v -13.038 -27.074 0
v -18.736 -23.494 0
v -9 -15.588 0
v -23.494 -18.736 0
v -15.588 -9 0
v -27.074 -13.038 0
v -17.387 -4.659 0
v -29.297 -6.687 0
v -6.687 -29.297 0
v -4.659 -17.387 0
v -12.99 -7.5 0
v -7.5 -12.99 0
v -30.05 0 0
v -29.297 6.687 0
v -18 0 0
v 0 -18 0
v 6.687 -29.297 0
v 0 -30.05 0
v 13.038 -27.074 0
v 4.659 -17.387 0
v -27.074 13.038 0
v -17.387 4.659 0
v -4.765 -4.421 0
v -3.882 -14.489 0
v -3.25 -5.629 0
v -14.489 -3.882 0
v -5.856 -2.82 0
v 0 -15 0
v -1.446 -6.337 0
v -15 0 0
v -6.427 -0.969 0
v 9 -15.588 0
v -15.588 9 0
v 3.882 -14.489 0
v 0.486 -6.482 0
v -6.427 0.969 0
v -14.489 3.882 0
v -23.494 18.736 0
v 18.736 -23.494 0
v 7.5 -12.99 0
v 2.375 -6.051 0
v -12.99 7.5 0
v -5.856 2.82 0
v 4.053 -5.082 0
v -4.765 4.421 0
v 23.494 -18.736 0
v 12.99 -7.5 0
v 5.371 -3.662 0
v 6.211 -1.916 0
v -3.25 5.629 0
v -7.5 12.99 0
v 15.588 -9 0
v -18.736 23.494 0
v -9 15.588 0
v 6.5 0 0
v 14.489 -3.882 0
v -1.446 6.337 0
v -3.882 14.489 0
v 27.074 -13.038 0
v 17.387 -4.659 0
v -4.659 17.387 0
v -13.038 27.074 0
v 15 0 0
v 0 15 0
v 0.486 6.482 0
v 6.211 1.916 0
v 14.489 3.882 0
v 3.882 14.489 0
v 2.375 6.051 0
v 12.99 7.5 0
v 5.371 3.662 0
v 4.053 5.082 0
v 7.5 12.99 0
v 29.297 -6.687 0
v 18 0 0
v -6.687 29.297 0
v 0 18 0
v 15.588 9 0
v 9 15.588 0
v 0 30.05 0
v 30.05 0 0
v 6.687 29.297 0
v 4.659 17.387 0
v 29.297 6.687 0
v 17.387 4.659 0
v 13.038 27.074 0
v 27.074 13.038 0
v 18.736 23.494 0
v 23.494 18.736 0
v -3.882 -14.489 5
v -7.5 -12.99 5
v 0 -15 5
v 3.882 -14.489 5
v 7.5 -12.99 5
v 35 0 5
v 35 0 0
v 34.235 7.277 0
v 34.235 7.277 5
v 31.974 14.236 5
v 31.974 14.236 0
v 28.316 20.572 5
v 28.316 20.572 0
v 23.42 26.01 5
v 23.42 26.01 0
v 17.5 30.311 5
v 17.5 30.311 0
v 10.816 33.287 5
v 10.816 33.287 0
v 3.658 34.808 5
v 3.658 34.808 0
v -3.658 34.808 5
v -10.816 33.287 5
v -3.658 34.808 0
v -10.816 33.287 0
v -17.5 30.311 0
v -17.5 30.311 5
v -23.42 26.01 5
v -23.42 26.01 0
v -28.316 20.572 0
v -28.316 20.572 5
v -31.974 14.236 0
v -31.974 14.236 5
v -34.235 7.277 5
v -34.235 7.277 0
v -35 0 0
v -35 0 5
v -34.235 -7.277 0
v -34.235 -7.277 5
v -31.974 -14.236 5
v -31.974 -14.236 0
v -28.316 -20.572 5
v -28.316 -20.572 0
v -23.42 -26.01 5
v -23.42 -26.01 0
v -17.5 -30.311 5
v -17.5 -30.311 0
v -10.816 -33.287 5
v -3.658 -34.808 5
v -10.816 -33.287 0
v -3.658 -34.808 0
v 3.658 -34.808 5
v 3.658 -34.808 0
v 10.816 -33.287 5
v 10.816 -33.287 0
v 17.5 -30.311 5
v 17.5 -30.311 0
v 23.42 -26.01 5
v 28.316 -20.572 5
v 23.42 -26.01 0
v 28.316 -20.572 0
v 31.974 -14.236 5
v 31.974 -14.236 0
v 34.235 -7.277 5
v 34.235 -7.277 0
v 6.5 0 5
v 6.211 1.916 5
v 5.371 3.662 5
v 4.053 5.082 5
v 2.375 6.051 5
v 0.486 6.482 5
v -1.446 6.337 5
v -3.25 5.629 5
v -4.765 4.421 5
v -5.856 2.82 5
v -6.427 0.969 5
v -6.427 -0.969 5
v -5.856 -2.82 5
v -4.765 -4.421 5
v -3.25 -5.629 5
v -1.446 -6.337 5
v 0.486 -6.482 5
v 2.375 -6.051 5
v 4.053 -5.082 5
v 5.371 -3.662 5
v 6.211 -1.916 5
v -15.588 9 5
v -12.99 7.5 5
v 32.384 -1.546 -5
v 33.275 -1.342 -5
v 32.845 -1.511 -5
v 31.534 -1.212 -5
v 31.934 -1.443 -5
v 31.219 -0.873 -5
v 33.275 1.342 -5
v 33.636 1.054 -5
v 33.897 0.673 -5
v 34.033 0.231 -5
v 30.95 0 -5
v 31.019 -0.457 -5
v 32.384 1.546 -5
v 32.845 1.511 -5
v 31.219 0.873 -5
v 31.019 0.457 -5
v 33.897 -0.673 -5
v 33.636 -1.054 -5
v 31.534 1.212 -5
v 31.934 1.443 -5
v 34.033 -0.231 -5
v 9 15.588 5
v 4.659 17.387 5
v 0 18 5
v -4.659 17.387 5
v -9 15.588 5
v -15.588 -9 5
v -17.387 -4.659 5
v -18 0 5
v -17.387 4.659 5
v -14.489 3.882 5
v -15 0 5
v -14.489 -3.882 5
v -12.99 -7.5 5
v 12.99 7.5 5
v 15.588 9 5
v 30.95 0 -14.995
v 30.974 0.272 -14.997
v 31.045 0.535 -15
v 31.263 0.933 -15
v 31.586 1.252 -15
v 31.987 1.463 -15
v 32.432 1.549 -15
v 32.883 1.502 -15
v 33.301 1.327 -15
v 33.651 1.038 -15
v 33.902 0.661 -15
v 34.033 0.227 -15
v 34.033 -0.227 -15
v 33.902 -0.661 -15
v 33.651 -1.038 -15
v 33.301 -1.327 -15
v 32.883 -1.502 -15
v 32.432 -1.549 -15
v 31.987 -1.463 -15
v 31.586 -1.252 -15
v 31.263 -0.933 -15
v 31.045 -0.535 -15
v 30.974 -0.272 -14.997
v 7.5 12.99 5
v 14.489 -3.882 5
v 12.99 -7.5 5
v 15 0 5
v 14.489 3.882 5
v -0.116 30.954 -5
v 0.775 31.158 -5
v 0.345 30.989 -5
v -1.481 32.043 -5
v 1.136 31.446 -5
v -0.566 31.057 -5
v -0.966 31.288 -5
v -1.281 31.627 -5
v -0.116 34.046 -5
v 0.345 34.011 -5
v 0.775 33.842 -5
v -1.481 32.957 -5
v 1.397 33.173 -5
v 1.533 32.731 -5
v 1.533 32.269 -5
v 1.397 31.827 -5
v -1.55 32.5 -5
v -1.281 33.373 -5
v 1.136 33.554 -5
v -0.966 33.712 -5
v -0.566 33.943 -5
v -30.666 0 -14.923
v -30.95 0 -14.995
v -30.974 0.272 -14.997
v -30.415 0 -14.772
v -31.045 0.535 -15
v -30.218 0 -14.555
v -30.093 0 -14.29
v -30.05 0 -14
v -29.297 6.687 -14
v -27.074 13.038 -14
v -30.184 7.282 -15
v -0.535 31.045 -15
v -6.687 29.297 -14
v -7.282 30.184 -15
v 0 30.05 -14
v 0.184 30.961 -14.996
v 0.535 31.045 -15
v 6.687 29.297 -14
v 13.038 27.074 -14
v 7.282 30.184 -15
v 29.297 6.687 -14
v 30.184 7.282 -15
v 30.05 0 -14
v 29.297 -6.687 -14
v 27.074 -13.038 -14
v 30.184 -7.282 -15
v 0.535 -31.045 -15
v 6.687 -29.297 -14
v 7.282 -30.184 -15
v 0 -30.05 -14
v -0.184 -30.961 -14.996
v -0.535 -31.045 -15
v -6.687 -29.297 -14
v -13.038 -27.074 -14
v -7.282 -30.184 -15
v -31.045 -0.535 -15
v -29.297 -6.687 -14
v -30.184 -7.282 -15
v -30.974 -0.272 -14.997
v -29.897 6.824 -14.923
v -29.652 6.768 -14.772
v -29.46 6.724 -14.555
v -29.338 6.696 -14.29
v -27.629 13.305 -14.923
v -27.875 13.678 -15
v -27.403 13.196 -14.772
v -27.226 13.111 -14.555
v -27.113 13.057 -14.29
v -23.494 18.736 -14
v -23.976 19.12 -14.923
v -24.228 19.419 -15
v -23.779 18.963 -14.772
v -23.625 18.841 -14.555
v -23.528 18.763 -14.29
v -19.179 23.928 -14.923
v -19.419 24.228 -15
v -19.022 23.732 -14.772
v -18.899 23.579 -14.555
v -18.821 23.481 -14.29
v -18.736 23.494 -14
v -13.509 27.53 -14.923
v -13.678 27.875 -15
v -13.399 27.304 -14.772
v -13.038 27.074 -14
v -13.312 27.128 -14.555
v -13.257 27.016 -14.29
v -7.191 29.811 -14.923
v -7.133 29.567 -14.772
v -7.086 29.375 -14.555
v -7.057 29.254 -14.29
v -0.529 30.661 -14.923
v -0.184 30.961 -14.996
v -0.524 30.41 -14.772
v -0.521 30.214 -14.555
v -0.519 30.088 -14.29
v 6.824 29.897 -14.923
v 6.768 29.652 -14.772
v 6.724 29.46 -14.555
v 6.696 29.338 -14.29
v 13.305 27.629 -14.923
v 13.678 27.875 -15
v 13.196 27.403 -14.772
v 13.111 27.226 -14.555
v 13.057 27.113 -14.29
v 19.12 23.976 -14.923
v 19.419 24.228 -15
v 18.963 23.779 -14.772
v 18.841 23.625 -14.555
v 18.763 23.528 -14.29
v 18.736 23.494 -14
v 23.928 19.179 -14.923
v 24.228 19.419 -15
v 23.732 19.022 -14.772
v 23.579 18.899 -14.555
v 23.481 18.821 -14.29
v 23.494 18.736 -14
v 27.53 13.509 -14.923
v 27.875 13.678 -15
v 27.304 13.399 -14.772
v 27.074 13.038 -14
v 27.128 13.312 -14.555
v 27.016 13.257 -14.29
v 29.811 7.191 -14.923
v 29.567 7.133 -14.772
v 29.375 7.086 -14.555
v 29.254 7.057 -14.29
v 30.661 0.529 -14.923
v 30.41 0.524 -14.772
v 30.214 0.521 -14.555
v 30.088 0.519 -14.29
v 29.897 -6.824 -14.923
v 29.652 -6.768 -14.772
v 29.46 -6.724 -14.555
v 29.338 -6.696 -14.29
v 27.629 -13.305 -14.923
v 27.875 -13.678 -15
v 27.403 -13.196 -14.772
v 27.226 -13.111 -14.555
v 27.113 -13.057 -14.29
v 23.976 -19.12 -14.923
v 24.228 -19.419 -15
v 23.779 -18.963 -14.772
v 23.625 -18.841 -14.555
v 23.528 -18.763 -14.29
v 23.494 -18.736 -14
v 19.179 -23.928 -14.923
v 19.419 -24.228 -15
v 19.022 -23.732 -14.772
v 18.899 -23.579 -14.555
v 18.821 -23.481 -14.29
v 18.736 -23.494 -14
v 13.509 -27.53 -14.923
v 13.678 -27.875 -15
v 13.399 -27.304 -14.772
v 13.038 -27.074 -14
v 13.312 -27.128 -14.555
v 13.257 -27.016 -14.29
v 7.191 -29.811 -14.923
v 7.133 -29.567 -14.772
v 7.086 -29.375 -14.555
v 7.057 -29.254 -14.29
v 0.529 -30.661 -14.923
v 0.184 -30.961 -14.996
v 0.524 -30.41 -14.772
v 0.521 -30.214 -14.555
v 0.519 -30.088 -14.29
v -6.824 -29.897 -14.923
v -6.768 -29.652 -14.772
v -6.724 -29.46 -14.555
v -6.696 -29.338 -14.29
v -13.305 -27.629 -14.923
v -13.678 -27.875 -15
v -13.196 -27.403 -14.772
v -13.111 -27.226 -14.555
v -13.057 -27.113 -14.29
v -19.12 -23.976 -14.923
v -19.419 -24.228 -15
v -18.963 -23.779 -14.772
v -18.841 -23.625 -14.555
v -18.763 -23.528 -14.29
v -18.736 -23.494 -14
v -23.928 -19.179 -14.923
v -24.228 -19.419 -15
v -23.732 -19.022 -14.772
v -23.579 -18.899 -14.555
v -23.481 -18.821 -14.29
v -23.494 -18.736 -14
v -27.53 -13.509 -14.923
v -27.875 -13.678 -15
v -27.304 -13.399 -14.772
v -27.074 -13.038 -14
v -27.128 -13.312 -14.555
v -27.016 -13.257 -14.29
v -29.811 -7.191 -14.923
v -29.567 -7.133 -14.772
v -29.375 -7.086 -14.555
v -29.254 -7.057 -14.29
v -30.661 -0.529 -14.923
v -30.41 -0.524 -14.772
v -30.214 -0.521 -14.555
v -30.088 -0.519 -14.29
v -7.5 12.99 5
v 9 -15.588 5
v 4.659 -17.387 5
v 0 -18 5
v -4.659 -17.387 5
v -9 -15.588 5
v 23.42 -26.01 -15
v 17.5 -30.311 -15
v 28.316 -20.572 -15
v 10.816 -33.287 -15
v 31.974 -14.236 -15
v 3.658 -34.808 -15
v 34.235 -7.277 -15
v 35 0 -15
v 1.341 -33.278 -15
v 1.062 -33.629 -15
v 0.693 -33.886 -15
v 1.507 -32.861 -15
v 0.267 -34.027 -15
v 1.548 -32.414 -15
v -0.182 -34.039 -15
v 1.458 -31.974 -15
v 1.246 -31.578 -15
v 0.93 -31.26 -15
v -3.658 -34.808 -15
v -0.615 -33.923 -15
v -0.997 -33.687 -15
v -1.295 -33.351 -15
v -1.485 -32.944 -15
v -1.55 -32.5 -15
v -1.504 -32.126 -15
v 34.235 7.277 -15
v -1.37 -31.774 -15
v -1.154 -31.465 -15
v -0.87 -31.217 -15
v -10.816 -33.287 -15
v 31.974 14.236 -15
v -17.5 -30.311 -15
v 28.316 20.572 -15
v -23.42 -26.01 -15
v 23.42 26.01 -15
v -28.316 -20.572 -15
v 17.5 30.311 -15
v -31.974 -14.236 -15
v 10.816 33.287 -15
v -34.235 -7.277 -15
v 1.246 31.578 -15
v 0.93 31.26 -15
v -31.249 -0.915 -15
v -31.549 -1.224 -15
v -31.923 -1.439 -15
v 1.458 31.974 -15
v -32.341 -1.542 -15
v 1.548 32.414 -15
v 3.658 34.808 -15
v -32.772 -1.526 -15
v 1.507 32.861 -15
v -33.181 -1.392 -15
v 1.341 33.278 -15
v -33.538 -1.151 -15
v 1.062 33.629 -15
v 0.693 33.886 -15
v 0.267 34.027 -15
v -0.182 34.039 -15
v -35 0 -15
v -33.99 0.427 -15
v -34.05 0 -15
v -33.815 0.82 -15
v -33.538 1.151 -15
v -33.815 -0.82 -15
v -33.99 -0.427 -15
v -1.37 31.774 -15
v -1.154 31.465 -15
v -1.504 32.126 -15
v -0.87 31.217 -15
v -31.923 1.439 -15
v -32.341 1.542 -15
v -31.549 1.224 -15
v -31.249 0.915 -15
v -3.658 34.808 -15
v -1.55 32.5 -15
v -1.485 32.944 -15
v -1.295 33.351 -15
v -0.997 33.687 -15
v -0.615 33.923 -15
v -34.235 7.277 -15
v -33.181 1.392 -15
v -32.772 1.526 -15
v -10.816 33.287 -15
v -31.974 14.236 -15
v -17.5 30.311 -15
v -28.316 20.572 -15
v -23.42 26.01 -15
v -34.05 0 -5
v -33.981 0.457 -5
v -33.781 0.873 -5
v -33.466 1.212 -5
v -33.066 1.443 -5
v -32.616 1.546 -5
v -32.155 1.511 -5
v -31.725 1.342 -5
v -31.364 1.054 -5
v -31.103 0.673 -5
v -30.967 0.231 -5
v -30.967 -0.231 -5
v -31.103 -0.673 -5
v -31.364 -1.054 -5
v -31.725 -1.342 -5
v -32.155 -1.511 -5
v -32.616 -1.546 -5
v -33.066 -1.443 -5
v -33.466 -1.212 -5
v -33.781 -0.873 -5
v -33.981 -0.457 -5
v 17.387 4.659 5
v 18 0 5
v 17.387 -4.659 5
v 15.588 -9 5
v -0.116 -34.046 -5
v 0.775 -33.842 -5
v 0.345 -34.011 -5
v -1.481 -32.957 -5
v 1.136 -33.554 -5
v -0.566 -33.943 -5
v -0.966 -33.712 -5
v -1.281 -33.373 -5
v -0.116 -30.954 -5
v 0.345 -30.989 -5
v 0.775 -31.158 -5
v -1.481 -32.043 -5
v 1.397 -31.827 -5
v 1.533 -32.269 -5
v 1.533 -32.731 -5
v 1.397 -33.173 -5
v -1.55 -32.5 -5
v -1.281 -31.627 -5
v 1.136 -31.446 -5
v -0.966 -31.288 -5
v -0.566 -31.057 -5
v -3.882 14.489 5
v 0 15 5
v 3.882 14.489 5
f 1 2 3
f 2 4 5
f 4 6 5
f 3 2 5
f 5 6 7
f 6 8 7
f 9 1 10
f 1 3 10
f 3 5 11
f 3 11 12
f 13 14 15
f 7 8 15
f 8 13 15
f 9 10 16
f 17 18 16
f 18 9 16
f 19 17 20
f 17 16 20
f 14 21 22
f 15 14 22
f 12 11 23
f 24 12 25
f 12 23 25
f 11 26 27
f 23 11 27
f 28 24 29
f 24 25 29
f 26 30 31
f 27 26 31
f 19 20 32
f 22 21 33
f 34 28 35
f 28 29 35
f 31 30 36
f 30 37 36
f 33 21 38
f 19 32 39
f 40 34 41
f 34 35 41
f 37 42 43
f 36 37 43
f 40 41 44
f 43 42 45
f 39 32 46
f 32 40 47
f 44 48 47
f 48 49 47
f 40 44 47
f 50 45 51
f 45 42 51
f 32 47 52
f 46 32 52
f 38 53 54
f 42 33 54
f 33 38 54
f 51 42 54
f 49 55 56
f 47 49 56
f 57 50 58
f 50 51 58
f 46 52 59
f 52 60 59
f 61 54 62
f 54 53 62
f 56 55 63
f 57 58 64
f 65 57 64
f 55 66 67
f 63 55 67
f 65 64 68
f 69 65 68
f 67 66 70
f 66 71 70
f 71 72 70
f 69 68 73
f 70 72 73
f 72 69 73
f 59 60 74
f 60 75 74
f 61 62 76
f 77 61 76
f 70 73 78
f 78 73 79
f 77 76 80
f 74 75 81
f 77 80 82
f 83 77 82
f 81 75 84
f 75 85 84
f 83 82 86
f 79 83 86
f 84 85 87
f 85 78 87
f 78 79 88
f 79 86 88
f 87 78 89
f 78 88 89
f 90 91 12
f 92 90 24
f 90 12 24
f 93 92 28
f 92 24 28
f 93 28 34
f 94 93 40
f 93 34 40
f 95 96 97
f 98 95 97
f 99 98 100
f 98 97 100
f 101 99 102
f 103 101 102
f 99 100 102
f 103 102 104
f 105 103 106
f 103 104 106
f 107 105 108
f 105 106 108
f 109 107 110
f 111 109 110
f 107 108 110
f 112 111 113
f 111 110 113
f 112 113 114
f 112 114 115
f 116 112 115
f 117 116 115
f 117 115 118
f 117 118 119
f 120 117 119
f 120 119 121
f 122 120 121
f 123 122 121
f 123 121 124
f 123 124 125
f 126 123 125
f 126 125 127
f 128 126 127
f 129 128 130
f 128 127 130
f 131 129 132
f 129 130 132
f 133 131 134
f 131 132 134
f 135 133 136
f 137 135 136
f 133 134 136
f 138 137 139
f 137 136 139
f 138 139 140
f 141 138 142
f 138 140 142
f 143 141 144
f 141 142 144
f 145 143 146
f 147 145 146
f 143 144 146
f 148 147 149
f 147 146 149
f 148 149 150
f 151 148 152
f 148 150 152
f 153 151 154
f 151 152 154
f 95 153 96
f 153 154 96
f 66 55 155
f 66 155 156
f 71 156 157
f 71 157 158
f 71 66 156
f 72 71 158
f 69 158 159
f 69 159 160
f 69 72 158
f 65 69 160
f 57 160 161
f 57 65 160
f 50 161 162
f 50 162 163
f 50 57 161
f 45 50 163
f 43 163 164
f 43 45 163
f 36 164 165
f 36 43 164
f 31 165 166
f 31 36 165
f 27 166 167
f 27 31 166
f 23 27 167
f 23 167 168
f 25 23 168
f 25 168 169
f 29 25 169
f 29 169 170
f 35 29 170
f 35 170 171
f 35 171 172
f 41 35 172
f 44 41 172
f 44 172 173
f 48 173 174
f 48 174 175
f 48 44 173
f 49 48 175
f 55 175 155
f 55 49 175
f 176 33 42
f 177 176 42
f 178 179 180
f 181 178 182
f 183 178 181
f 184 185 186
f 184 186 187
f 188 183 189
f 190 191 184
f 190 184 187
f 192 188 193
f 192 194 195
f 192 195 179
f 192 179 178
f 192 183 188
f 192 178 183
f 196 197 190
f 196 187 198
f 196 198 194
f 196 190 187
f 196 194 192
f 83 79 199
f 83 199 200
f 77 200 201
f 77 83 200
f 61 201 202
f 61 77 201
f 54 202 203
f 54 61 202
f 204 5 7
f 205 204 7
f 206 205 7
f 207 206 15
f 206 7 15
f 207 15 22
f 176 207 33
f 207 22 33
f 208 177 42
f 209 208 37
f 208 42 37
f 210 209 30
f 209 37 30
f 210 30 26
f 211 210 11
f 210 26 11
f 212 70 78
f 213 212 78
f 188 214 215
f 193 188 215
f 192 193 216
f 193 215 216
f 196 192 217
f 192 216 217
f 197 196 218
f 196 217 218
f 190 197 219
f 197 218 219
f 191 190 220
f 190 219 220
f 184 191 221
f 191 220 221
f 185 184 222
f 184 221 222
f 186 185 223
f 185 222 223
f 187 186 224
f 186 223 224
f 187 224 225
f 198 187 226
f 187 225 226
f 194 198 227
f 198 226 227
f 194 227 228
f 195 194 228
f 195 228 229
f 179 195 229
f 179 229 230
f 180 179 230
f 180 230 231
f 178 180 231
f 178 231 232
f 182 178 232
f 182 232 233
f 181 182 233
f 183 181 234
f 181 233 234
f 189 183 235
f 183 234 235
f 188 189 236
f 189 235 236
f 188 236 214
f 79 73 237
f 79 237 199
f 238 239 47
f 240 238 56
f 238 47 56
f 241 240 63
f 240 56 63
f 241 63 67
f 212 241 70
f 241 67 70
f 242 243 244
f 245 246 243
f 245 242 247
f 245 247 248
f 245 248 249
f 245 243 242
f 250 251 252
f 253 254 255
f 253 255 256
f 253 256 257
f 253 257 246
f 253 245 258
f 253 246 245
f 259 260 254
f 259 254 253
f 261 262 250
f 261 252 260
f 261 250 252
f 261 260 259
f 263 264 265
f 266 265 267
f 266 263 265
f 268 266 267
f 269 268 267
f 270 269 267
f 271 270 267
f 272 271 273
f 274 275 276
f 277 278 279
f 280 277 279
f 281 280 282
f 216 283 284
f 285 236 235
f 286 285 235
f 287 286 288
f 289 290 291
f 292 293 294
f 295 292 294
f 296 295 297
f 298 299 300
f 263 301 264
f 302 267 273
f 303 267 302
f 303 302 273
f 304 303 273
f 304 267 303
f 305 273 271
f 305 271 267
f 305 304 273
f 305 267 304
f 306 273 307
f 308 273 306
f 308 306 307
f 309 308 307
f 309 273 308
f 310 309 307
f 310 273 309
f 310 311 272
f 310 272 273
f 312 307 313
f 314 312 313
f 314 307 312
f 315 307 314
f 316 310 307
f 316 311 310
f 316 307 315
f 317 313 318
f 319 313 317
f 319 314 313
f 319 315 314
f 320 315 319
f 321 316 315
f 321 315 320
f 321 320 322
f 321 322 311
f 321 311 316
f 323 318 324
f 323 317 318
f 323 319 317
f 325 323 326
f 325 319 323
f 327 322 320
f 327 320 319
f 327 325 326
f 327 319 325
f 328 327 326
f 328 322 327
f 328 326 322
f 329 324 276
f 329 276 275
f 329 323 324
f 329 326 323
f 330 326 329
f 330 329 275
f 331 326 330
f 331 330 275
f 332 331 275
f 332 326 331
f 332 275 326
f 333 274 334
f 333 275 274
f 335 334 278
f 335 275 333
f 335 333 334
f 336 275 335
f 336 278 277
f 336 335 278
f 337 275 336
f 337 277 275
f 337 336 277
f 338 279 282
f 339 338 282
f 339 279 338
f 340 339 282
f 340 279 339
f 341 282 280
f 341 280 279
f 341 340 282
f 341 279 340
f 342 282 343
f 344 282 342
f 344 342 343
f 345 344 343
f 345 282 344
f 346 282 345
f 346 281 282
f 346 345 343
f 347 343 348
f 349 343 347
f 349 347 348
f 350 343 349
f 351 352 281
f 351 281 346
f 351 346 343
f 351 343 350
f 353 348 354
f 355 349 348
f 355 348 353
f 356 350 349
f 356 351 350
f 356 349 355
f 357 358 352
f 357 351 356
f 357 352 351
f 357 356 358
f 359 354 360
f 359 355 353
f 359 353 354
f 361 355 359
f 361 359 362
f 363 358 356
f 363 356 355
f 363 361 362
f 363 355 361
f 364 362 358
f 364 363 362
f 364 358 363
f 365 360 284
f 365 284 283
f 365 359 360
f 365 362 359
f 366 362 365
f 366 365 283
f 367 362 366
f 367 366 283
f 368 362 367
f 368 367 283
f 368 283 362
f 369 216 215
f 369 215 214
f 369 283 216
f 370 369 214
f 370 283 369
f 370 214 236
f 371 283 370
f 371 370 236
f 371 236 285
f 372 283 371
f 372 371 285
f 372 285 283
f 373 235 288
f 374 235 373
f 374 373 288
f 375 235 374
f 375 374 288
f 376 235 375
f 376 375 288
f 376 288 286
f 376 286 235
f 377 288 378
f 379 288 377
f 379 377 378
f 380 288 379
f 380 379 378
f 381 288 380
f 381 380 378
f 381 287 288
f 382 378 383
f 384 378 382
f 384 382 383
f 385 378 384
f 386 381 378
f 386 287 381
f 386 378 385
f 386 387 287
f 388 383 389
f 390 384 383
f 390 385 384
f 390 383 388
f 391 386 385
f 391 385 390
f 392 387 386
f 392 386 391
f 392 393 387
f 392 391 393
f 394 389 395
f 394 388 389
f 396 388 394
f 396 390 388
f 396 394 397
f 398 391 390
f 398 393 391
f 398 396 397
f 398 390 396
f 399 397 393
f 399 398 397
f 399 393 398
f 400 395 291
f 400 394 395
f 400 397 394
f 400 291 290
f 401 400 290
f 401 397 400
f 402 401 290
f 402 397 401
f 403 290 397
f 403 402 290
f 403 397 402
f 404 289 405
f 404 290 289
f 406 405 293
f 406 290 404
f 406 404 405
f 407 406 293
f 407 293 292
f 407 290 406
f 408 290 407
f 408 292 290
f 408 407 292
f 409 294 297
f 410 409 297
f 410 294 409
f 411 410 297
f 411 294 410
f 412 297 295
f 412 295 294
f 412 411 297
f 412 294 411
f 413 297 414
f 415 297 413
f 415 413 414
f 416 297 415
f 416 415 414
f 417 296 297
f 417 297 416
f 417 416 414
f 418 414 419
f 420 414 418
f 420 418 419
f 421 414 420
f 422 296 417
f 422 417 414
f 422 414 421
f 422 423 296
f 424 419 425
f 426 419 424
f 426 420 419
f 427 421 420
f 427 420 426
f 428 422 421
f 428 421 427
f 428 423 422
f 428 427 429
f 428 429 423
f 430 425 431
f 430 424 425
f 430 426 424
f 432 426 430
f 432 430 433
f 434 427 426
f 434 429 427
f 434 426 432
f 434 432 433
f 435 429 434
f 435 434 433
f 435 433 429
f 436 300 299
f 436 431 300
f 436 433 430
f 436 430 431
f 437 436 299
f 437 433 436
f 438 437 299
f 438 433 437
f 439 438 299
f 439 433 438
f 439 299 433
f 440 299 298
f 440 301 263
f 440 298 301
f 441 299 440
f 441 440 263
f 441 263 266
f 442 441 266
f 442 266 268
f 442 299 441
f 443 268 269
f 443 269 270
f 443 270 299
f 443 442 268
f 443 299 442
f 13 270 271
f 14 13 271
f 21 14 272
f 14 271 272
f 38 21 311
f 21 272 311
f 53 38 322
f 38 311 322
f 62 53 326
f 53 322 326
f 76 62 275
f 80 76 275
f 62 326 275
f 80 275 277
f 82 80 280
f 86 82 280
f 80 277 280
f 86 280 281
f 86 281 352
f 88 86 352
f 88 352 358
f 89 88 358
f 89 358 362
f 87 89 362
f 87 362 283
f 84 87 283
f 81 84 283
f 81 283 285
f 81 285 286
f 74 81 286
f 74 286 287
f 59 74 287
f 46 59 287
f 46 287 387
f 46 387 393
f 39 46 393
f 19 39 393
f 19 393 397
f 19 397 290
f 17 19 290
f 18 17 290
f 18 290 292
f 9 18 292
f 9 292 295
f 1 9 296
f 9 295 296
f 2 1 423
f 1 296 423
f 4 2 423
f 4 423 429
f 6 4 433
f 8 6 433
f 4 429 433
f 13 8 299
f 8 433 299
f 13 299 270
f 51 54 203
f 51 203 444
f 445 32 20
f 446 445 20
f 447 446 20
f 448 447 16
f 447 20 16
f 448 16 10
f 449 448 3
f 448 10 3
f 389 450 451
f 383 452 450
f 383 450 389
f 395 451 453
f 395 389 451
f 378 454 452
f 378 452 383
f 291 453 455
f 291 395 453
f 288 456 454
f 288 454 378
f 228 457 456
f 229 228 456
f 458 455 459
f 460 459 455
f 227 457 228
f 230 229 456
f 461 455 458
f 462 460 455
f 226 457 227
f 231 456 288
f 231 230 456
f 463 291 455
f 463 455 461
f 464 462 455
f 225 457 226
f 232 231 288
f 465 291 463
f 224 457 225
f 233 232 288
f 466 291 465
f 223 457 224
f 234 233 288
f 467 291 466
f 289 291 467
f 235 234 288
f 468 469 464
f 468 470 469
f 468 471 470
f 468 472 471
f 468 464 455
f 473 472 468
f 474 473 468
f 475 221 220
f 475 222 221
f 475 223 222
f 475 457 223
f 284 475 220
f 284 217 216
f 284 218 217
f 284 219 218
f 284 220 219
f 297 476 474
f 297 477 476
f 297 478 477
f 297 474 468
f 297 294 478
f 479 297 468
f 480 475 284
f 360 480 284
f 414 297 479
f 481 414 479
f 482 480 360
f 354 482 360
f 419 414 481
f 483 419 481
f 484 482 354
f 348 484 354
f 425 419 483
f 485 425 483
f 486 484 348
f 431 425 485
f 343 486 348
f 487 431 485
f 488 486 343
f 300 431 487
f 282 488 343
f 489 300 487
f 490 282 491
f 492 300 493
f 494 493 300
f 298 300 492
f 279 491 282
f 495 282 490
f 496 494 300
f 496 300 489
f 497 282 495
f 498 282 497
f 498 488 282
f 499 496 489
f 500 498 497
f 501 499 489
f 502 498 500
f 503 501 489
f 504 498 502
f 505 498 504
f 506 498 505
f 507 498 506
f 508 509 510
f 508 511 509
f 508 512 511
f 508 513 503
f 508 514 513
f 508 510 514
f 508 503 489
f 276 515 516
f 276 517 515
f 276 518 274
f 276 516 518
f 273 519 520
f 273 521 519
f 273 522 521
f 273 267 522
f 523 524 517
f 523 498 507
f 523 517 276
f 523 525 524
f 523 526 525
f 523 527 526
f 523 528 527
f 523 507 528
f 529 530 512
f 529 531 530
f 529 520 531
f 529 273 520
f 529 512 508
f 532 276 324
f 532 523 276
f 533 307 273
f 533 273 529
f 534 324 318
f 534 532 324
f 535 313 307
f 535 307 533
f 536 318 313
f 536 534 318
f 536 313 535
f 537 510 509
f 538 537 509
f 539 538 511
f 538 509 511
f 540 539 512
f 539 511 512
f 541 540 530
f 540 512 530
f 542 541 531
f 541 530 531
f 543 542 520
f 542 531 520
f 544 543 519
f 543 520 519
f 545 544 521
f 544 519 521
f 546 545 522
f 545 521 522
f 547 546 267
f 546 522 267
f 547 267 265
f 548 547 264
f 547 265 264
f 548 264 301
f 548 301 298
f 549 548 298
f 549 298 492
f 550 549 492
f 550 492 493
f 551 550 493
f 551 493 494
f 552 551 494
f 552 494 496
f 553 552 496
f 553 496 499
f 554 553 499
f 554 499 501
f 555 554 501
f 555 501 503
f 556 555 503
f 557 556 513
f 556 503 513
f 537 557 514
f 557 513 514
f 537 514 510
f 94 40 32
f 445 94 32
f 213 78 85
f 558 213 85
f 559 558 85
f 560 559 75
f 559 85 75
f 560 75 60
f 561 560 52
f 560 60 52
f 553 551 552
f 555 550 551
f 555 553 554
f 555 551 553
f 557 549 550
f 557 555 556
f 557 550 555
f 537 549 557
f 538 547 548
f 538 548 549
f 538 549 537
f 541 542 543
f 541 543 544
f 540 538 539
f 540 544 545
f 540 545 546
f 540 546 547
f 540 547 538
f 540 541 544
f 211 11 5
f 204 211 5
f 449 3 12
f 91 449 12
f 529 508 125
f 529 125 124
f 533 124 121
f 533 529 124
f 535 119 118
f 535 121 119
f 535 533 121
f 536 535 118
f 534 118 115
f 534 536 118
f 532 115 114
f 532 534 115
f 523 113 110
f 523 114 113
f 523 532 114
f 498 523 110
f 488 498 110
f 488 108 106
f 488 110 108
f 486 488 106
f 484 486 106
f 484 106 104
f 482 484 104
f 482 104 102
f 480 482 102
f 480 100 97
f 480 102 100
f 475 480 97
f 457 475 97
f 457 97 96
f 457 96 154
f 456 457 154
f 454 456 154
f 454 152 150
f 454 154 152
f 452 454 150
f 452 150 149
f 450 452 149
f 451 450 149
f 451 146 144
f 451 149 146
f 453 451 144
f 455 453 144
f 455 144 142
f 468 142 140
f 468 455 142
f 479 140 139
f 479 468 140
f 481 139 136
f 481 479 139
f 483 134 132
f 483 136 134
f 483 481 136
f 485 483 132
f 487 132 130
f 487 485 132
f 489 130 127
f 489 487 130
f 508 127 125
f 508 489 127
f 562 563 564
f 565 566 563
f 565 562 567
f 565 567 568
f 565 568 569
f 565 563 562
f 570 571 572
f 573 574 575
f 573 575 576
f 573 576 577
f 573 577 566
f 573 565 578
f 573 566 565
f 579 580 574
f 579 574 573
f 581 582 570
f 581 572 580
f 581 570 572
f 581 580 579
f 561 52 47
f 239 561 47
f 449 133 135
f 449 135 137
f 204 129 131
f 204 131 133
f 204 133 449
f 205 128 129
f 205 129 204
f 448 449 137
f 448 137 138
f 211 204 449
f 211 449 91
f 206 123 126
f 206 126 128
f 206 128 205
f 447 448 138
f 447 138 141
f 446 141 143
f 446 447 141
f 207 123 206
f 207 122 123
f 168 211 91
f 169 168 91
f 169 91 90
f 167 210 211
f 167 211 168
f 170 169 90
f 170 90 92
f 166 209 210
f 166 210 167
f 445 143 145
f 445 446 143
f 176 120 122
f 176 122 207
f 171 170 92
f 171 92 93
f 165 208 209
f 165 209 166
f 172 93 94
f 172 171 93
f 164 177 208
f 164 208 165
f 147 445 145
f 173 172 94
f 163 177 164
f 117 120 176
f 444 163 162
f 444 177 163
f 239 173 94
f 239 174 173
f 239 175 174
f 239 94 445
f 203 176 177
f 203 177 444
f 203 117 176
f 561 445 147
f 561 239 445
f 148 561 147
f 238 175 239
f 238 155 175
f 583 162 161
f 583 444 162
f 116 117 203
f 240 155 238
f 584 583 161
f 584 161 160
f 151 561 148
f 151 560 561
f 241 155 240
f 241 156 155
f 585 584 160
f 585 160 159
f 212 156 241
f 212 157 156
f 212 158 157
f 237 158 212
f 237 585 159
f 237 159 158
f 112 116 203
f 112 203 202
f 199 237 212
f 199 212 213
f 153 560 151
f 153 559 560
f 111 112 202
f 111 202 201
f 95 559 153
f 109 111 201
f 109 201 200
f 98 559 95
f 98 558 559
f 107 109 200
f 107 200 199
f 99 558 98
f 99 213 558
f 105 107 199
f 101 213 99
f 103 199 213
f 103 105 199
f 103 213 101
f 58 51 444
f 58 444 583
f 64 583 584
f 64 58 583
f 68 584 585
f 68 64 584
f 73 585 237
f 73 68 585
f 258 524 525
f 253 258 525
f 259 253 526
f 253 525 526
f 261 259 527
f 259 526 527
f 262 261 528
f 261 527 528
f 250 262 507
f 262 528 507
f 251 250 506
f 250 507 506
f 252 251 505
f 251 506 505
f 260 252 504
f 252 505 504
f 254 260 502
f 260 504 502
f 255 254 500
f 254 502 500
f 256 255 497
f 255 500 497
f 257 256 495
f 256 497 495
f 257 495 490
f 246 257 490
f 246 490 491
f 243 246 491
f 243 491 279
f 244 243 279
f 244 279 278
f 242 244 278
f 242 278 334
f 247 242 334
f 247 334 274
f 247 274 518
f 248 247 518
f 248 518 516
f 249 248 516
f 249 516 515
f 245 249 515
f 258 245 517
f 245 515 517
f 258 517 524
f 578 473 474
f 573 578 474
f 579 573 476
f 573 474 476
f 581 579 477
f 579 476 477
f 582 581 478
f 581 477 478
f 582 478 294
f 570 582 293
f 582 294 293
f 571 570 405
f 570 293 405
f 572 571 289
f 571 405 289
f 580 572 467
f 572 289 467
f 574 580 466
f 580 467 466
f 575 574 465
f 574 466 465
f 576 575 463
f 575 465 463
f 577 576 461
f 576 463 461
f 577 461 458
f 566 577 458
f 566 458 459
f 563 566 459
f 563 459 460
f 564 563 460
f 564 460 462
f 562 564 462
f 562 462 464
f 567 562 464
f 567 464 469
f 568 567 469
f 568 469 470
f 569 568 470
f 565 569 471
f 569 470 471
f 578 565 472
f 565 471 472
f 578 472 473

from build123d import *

# Parameters (mm, degrees)
SKETCH_2_R          = 35
SKETCH_2_R_2        = 6.5
EXTRUDE_1_DEPTH     = 5
EXTRUDE_START       = 15
SKETCH_3_R          = 35
SKETCH_3_R_2        = 30.05
EXTRUDE_2_DEPTH     = 15
SKETCH_4_R          = 1.55
CUT_EXTRUDE_1_DEPTH = 10
FILLET_1_R          = 1
CUT_EXTRUDE_2_DEPTH = 52.720402193


with BuildPart() as part:
    # 草图2 → 凸台-拉伸1 (new body)
    with BuildSketch(Plane.XY):
        Circle(SKETCH_2_R)
        Circle(SKETCH_2_R_2, mode=Mode.SUBTRACT)
    extrude(amount=EXTRUDE_1_DEPTH)

    # 草图3 → 凸台-拉伸2 (add)
    with BuildSketch(Plane(origin=(0, 0, 0), x_dir=(-1, 0, 0), z_dir=(0, 0, -1)).offset(EXTRUDE_START)):
        Circle(SKETCH_3_R)
        Circle(SKETCH_3_R_2, mode=Mode.SUBTRACT)
    extrude(amount=-EXTRUDE_2_DEPTH)

    # 草图4 → 切除-拉伸1 (cut)
    with BuildSketch(Plane(origin=(0, 0, -15), x_dir=(-1, 0, 0), z_dir=(0, 0, -1))):
        with Locations((0, 32.5)):
            Circle(SKETCH_4_R)
        with Locations((32.5, 0)):
            Circle(SKETCH_4_R)
        with Locations((0, -32.5)):
            Circle(SKETCH_4_R)
        with Locations((-32.5, 0)):
            Circle(SKETCH_4_R)
    extrude(amount=-CUT_EXTRUDE_1_DEPTH, mode=Mode.SUBTRACT)

    # 圆角1
    # the kernel refuses this fillet: 1 mm, written as the material it takes off along each edge
    with BuildSketch(Plane(origin=(0, 0, -15), x_dir=(-1, 0, 0), z_dir=(0, -1, 0))) as fillet_1_piece_1:
        with BuildLine():
            CenterArc((30.05 + FILLET_1_R, -FILLET_1_R), FILLET_1_R, 90, 90)
            Line((30.05, -FILLET_1_R), (30.05, 0))
            Line((30.05, 0), (30.05 + FILLET_1_R, 0))
        make_face()
    revolve(axis=Axis((0, 0, -15), (0, 0, -1)), mode=Mode.SUBTRACT)

    # 草图5 → 切除-拉伸2 (cut, through all)
    with BuildSketch(Plane(origin=(0, 0, 0), x_dir=(-1, 0, 0), z_dir=(0, 0, -1))):
        with BuildLine():
            Line((12.990381057, -7.5), (15.588457268, -9))
            ThreePointArc((15.588457268, -9), (18, 0), (15.588457268, 9))
            Line((15.588457268, 9), (12.990381057, 7.5))
            ThreePointArc((12.990381057, 7.5), (15, 0), (12.990381057, -7.5))
        make_face()
        with BuildLine():
            Line((-7.5, 12.990381057), (-9, 15.588457268))
            ThreePointArc((-9, 15.588457268), (0, 18), (9, 15.588457268))
            Line((9, 15.588457268), (7.5, 12.990381057))
            ThreePointArc((7.5, 12.990381057), (0, 15), (-7.5, 12.990381057))
        make_face()
        with BuildLine():
            Line((-7.5, -12.990381057), (-9, -15.588457268))
            ThreePointArc((-9, -15.588457268), (0, -18), (9, -15.588457268))
            Line((9, -15.588457268), (7.5, -12.990381057))
            ThreePointArc((7.5, -12.990381057), (0, -15), (-7.5, -12.990381057))
        make_face()
        with BuildLine():
            Line((-12.990381057, 7.5), (-15.588457268, 9))
            ThreePointArc((-15.588457268, 9), (-18, 0), (-15.588457268, -9))
            Line((-15.588457268, -9), (-12.990381057, -7.5))
            ThreePointArc((-12.990381057, -7.5), (-15, 0), (-12.990381057, 7.5))
        make_face()
    extrude(amount=-CUT_EXTRUDE_2_DEPTH, mode=Mode.SUBTRACT)


solid = part.part
